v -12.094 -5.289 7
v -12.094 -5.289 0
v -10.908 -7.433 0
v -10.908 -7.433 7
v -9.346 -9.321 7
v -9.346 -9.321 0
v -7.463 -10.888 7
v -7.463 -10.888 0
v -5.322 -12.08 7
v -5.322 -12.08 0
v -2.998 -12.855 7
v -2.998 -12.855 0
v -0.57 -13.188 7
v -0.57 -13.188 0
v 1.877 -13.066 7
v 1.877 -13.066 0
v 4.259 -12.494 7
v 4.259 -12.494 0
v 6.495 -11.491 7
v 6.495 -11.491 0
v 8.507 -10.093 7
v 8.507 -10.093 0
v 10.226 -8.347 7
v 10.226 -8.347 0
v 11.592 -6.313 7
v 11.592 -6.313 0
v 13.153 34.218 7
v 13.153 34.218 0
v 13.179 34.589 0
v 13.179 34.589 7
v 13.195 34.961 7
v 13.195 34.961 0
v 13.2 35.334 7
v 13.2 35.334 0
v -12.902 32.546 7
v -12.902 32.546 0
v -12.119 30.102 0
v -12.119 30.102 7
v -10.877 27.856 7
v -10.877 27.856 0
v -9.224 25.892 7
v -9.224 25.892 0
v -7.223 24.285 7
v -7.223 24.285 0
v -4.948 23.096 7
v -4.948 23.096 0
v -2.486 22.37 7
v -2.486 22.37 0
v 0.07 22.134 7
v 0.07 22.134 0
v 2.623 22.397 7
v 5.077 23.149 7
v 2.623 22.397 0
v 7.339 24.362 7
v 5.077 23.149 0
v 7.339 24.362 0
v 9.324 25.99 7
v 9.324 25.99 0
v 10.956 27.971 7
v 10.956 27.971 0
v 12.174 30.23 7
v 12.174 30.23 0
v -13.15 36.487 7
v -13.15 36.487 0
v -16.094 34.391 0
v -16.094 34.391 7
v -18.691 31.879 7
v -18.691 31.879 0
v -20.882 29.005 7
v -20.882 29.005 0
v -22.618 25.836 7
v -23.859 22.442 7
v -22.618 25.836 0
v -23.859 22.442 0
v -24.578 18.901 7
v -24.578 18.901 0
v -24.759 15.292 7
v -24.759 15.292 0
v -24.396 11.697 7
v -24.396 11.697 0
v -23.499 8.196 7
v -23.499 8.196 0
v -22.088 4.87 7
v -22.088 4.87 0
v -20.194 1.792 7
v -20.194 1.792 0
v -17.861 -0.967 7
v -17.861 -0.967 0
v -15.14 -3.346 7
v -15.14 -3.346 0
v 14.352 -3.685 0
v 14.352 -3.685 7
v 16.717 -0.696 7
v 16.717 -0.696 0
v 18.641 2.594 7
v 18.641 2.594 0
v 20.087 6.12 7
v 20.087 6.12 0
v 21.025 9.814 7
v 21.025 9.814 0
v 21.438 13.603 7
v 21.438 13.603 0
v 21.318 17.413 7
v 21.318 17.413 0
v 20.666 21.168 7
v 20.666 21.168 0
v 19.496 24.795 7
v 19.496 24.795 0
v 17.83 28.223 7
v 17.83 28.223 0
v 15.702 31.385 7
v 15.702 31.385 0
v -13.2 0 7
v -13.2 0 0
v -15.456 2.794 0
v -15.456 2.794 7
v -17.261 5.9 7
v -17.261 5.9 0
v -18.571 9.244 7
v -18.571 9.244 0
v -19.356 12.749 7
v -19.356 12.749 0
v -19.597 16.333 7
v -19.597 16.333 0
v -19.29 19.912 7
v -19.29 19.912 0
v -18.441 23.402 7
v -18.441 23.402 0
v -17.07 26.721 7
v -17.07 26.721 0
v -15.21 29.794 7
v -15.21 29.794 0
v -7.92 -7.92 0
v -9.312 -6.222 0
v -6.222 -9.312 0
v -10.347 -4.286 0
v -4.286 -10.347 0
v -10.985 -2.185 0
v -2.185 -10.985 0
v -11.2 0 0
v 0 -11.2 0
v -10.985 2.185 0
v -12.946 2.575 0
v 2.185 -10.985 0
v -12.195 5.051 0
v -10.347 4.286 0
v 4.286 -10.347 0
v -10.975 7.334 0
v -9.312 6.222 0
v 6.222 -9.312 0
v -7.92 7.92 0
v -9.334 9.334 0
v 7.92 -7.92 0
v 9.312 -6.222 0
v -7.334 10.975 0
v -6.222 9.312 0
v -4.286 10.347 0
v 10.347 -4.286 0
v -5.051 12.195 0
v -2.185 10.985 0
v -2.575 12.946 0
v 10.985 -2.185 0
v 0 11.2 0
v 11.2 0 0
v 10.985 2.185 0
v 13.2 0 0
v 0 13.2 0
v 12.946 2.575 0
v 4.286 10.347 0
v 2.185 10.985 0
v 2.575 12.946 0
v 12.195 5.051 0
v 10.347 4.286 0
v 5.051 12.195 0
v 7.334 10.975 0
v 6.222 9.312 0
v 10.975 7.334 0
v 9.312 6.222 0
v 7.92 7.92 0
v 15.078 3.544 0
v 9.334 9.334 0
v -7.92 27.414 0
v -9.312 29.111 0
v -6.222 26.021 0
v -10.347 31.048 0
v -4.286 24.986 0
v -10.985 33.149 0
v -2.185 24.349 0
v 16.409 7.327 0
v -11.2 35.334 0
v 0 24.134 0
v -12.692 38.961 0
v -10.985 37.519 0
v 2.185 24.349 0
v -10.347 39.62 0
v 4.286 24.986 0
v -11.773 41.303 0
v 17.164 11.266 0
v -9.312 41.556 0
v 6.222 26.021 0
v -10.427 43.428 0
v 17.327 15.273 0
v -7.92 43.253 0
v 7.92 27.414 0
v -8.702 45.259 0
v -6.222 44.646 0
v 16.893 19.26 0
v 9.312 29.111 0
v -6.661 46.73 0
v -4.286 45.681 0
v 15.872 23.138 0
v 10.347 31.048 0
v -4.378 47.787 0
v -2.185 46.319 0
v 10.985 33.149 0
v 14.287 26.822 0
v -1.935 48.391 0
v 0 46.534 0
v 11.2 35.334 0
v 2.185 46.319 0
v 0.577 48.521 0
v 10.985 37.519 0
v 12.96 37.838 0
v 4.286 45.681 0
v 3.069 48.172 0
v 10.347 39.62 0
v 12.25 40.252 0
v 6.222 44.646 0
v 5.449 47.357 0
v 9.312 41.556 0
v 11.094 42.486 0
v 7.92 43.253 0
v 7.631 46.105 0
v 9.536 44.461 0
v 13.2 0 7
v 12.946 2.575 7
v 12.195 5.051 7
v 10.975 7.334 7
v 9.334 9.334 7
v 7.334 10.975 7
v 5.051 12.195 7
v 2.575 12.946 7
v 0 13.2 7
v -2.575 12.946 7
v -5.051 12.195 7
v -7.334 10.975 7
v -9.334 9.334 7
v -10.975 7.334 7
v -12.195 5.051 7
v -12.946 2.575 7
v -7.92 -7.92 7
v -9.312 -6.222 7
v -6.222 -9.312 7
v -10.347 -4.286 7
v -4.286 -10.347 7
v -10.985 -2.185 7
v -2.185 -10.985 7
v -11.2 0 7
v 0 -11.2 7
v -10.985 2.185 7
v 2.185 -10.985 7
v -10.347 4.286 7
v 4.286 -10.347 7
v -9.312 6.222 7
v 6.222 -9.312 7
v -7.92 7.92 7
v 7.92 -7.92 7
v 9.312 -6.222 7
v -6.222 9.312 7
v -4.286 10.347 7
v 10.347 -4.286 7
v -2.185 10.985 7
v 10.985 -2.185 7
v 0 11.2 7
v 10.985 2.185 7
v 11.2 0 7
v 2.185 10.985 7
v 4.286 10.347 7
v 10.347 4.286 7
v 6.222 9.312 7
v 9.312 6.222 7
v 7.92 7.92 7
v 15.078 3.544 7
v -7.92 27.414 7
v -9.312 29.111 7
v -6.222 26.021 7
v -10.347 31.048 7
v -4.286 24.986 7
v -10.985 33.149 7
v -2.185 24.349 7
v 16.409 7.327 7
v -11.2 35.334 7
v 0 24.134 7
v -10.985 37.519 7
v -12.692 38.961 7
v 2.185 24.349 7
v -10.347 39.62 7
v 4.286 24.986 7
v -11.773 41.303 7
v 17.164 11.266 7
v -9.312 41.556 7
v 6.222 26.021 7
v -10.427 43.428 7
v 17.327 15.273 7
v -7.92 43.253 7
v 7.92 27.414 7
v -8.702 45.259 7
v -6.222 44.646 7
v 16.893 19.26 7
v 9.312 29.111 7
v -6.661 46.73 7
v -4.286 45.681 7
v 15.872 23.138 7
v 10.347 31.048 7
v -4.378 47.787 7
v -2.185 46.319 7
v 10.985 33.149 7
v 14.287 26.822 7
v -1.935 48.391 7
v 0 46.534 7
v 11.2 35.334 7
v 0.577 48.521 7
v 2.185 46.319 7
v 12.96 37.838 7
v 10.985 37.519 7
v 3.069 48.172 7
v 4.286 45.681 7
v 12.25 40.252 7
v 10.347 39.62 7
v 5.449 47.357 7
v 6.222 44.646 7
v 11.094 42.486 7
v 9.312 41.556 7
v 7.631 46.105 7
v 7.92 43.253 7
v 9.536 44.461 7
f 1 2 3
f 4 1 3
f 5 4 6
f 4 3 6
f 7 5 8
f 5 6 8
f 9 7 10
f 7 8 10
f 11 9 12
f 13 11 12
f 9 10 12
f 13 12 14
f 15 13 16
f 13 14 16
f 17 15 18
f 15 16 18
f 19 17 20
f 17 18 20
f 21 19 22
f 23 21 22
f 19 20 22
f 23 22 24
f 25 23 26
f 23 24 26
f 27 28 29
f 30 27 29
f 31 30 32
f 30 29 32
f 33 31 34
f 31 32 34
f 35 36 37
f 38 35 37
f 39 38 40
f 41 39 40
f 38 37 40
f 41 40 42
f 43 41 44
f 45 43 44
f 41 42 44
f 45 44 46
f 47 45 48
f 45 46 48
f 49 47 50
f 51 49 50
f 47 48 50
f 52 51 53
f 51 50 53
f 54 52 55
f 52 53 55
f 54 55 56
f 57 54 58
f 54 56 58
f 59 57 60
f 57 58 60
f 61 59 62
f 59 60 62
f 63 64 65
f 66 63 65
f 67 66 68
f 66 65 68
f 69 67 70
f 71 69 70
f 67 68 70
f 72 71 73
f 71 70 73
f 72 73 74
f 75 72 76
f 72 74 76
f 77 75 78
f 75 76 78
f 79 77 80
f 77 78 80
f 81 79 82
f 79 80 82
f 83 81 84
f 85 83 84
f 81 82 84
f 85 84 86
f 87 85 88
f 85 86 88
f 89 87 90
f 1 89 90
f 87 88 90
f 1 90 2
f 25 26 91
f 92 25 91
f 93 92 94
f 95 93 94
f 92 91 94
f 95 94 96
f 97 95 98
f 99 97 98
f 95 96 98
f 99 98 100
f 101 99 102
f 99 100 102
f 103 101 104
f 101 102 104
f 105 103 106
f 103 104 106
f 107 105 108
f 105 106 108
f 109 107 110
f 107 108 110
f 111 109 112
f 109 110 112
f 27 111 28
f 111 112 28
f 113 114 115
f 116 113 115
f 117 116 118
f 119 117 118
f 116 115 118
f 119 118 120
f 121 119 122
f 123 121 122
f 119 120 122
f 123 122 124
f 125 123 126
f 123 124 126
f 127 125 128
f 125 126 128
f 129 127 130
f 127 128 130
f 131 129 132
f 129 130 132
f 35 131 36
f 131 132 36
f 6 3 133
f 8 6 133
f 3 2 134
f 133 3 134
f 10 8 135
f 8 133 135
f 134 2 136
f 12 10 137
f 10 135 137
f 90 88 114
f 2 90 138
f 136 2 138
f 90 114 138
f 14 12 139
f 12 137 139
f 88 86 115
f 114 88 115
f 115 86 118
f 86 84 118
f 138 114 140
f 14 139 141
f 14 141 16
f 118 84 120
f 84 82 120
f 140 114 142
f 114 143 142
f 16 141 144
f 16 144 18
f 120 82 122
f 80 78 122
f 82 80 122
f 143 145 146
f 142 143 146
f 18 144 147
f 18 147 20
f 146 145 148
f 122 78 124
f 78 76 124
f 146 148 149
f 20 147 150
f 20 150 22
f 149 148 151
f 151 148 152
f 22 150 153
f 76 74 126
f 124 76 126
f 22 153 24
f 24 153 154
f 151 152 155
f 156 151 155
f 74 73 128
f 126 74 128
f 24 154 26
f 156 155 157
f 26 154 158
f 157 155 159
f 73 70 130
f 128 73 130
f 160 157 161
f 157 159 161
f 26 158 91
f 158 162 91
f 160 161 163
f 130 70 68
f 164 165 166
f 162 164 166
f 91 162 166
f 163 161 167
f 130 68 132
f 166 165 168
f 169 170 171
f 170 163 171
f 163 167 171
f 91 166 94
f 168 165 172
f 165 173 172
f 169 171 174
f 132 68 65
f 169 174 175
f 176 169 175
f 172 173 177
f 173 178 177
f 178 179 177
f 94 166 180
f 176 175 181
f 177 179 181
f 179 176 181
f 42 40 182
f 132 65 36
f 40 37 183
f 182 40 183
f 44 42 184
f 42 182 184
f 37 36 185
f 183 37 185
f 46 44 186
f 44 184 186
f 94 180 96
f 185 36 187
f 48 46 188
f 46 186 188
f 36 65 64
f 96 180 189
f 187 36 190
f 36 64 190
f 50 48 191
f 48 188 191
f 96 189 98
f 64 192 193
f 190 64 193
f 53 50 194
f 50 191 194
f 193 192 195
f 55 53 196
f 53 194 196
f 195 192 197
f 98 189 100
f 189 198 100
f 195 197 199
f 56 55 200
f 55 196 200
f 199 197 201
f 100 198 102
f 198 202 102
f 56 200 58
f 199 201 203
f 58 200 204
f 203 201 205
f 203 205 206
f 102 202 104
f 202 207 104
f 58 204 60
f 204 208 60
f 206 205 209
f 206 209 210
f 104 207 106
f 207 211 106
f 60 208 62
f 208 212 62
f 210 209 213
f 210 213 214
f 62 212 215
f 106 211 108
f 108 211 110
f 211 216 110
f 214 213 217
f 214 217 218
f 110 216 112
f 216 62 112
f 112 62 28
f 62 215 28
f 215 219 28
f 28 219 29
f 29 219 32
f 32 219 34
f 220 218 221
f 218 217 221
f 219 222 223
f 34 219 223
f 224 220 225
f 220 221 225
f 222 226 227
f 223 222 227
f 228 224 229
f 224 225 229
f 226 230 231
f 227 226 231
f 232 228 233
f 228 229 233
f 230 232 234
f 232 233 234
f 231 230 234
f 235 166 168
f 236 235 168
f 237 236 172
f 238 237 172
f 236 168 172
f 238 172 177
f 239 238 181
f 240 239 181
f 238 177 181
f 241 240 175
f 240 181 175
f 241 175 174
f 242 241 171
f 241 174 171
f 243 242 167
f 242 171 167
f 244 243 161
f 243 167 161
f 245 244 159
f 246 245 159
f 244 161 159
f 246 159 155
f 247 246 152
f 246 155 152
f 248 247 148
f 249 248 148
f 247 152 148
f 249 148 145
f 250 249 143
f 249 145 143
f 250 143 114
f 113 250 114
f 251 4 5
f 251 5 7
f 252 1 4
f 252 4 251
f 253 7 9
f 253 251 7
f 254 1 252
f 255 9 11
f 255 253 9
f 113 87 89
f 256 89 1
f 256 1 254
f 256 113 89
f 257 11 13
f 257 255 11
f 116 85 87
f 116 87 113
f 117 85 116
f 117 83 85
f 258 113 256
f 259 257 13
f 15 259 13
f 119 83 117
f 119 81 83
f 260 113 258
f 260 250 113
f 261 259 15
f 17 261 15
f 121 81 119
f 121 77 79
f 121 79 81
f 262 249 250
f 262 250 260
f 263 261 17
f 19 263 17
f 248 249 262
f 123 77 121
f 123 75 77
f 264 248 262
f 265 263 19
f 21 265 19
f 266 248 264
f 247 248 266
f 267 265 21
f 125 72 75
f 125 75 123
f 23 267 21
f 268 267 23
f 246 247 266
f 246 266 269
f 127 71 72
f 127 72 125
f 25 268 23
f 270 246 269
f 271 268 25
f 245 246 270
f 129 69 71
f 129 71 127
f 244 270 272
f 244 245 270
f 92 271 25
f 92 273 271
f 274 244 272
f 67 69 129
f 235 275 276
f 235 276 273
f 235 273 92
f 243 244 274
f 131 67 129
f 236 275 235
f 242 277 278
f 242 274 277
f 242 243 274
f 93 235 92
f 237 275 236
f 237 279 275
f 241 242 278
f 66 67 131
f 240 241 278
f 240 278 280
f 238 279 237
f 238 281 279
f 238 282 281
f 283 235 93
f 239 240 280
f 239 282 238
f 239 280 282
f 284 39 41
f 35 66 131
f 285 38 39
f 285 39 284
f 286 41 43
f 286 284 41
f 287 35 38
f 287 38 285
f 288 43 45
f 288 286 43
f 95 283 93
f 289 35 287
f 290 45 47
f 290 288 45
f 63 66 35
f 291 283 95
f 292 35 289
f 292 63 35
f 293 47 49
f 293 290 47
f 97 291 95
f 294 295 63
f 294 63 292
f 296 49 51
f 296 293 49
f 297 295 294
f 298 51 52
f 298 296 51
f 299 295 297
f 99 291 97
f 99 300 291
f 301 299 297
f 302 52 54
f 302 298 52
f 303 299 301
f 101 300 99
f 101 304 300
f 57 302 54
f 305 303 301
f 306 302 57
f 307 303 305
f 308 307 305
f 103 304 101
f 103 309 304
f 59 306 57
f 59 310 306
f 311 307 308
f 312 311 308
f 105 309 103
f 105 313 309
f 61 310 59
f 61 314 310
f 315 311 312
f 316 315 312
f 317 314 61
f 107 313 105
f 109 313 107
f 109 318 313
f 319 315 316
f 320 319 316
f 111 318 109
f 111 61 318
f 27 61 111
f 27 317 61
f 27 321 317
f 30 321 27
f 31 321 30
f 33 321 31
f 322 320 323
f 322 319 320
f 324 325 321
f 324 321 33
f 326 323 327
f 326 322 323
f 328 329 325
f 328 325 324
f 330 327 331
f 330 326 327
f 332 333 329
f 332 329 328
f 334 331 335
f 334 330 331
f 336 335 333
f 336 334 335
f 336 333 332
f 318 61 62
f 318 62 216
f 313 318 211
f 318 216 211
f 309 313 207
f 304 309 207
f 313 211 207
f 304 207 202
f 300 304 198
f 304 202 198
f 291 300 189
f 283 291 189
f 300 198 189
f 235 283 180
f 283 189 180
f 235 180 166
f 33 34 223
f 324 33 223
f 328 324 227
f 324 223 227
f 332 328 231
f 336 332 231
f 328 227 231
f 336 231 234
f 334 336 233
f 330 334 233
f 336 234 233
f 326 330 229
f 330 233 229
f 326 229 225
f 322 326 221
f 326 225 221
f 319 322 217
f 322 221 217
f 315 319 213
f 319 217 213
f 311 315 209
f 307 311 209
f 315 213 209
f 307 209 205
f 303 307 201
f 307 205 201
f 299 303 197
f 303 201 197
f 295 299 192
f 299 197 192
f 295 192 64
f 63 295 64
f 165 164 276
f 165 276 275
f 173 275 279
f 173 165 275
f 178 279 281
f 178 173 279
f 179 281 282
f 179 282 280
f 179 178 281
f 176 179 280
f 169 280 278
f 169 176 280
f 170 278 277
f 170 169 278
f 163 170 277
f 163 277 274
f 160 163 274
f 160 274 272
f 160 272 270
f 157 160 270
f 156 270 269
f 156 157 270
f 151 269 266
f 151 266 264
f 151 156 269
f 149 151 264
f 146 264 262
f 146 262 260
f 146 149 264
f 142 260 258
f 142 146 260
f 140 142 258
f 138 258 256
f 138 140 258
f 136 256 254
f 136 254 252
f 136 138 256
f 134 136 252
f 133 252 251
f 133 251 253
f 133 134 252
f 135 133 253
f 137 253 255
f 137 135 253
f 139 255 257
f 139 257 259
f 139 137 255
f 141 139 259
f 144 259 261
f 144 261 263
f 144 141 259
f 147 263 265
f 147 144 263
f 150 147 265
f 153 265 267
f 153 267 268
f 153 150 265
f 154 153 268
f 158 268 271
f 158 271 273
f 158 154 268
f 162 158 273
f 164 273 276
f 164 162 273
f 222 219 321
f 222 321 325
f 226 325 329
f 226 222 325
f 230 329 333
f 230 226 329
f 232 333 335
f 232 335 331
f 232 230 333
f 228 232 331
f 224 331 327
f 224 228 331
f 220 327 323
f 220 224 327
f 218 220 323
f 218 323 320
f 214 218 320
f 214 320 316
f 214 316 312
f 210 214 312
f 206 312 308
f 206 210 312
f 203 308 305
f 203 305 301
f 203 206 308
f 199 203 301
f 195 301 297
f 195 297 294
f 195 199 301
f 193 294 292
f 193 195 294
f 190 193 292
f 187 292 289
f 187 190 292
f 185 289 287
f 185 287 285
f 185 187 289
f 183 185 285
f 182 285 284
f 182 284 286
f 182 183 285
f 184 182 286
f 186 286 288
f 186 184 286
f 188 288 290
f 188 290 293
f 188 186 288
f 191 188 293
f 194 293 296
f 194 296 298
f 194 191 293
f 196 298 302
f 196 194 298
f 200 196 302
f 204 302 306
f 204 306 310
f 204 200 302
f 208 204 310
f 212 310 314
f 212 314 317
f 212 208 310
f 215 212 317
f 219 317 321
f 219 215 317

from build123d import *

# Parameters (mm, degrees)
F0_R     = 11.2
F1_DEPTH = 7


with BuildPart() as f1:
    # F0 (on Top) → F1 (new body)
    with BuildSketch(Plane.XY):
        with BuildLine():
            ThreePointArc((11.59233, -6.31331), (12.79177, -3.257395), (13.2, 0))
            ThreePointArc((13.2, 0), (0, 13.2), (-13.2, 0))
            ThreePointArc((-13.2, 0), (-12.920509, -2.701933), (-12.093872, -5.289448))
            ThreePointArc((-12.093872, -5.289448), (-0.570052, -13.187685), (11.59233, -6.31331))
        make_face()
        Circle(F0_R, mode=Mode.SUBTRACT)
        with BuildLine():
            ThreePointArc((12.173578, 30.230427), (17.326701, 15.272754), (13.2, 0))
            ThreePointArc((13.2, 0), (12.79177, -3.257395), (11.59233, -6.31331))
            ThreePointArc((11.59233, -6.31331), (21.438452, 13.603178), (13.152736, 34.217724))
            ThreePointArc((13.152736, 34.217724), (12.819133, 32.185772), (12.173578, 30.230427))
        make_face()
        with BuildLine():
            ThreePointArc((-12.093872, -5.289448), (-12.920509, -2.701933), (-13.2, 0))
            ThreePointArc((-13.2, 0), (-19.597353, 16.33302), (-12.902327, 32.546295))
            ThreePointArc((-12.902327, 32.546295), (-13.174098, 34.507228), (-13.149548, 36.486753))
            ThreePointArc((-13.149548, 36.486753), (-24.758622, 15.291955), (-12.093872, -5.289448))
        make_face()
        with BuildLine():
            ThreePointArc((-12.902327, 32.546295), (-1.213911, 22.189696), (12.173578, 30.230427))
            ThreePointArc((12.173578, 30.230427), (12.819133, 32.185772), (13.152736, 34.217724))
            ThreePointArc((13.152736, 34.217724), (13.188179, 34.775242), (13.2, 35.33376))
            ThreePointArc((13.2, 35.33376), (0.577048, 48.521141), (-13.149548, 36.486753))
            ThreePointArc((-13.149548, 36.486753), (-13.174098, 34.507228), (-12.902327, 32.546295))
        make_face()
        with Locations((0, 35.33376)):
            Circle(F0_R, mode=Mode.SUBTRACT)
    extrude(amount=F1_DEPTH)


solid = f1.part
